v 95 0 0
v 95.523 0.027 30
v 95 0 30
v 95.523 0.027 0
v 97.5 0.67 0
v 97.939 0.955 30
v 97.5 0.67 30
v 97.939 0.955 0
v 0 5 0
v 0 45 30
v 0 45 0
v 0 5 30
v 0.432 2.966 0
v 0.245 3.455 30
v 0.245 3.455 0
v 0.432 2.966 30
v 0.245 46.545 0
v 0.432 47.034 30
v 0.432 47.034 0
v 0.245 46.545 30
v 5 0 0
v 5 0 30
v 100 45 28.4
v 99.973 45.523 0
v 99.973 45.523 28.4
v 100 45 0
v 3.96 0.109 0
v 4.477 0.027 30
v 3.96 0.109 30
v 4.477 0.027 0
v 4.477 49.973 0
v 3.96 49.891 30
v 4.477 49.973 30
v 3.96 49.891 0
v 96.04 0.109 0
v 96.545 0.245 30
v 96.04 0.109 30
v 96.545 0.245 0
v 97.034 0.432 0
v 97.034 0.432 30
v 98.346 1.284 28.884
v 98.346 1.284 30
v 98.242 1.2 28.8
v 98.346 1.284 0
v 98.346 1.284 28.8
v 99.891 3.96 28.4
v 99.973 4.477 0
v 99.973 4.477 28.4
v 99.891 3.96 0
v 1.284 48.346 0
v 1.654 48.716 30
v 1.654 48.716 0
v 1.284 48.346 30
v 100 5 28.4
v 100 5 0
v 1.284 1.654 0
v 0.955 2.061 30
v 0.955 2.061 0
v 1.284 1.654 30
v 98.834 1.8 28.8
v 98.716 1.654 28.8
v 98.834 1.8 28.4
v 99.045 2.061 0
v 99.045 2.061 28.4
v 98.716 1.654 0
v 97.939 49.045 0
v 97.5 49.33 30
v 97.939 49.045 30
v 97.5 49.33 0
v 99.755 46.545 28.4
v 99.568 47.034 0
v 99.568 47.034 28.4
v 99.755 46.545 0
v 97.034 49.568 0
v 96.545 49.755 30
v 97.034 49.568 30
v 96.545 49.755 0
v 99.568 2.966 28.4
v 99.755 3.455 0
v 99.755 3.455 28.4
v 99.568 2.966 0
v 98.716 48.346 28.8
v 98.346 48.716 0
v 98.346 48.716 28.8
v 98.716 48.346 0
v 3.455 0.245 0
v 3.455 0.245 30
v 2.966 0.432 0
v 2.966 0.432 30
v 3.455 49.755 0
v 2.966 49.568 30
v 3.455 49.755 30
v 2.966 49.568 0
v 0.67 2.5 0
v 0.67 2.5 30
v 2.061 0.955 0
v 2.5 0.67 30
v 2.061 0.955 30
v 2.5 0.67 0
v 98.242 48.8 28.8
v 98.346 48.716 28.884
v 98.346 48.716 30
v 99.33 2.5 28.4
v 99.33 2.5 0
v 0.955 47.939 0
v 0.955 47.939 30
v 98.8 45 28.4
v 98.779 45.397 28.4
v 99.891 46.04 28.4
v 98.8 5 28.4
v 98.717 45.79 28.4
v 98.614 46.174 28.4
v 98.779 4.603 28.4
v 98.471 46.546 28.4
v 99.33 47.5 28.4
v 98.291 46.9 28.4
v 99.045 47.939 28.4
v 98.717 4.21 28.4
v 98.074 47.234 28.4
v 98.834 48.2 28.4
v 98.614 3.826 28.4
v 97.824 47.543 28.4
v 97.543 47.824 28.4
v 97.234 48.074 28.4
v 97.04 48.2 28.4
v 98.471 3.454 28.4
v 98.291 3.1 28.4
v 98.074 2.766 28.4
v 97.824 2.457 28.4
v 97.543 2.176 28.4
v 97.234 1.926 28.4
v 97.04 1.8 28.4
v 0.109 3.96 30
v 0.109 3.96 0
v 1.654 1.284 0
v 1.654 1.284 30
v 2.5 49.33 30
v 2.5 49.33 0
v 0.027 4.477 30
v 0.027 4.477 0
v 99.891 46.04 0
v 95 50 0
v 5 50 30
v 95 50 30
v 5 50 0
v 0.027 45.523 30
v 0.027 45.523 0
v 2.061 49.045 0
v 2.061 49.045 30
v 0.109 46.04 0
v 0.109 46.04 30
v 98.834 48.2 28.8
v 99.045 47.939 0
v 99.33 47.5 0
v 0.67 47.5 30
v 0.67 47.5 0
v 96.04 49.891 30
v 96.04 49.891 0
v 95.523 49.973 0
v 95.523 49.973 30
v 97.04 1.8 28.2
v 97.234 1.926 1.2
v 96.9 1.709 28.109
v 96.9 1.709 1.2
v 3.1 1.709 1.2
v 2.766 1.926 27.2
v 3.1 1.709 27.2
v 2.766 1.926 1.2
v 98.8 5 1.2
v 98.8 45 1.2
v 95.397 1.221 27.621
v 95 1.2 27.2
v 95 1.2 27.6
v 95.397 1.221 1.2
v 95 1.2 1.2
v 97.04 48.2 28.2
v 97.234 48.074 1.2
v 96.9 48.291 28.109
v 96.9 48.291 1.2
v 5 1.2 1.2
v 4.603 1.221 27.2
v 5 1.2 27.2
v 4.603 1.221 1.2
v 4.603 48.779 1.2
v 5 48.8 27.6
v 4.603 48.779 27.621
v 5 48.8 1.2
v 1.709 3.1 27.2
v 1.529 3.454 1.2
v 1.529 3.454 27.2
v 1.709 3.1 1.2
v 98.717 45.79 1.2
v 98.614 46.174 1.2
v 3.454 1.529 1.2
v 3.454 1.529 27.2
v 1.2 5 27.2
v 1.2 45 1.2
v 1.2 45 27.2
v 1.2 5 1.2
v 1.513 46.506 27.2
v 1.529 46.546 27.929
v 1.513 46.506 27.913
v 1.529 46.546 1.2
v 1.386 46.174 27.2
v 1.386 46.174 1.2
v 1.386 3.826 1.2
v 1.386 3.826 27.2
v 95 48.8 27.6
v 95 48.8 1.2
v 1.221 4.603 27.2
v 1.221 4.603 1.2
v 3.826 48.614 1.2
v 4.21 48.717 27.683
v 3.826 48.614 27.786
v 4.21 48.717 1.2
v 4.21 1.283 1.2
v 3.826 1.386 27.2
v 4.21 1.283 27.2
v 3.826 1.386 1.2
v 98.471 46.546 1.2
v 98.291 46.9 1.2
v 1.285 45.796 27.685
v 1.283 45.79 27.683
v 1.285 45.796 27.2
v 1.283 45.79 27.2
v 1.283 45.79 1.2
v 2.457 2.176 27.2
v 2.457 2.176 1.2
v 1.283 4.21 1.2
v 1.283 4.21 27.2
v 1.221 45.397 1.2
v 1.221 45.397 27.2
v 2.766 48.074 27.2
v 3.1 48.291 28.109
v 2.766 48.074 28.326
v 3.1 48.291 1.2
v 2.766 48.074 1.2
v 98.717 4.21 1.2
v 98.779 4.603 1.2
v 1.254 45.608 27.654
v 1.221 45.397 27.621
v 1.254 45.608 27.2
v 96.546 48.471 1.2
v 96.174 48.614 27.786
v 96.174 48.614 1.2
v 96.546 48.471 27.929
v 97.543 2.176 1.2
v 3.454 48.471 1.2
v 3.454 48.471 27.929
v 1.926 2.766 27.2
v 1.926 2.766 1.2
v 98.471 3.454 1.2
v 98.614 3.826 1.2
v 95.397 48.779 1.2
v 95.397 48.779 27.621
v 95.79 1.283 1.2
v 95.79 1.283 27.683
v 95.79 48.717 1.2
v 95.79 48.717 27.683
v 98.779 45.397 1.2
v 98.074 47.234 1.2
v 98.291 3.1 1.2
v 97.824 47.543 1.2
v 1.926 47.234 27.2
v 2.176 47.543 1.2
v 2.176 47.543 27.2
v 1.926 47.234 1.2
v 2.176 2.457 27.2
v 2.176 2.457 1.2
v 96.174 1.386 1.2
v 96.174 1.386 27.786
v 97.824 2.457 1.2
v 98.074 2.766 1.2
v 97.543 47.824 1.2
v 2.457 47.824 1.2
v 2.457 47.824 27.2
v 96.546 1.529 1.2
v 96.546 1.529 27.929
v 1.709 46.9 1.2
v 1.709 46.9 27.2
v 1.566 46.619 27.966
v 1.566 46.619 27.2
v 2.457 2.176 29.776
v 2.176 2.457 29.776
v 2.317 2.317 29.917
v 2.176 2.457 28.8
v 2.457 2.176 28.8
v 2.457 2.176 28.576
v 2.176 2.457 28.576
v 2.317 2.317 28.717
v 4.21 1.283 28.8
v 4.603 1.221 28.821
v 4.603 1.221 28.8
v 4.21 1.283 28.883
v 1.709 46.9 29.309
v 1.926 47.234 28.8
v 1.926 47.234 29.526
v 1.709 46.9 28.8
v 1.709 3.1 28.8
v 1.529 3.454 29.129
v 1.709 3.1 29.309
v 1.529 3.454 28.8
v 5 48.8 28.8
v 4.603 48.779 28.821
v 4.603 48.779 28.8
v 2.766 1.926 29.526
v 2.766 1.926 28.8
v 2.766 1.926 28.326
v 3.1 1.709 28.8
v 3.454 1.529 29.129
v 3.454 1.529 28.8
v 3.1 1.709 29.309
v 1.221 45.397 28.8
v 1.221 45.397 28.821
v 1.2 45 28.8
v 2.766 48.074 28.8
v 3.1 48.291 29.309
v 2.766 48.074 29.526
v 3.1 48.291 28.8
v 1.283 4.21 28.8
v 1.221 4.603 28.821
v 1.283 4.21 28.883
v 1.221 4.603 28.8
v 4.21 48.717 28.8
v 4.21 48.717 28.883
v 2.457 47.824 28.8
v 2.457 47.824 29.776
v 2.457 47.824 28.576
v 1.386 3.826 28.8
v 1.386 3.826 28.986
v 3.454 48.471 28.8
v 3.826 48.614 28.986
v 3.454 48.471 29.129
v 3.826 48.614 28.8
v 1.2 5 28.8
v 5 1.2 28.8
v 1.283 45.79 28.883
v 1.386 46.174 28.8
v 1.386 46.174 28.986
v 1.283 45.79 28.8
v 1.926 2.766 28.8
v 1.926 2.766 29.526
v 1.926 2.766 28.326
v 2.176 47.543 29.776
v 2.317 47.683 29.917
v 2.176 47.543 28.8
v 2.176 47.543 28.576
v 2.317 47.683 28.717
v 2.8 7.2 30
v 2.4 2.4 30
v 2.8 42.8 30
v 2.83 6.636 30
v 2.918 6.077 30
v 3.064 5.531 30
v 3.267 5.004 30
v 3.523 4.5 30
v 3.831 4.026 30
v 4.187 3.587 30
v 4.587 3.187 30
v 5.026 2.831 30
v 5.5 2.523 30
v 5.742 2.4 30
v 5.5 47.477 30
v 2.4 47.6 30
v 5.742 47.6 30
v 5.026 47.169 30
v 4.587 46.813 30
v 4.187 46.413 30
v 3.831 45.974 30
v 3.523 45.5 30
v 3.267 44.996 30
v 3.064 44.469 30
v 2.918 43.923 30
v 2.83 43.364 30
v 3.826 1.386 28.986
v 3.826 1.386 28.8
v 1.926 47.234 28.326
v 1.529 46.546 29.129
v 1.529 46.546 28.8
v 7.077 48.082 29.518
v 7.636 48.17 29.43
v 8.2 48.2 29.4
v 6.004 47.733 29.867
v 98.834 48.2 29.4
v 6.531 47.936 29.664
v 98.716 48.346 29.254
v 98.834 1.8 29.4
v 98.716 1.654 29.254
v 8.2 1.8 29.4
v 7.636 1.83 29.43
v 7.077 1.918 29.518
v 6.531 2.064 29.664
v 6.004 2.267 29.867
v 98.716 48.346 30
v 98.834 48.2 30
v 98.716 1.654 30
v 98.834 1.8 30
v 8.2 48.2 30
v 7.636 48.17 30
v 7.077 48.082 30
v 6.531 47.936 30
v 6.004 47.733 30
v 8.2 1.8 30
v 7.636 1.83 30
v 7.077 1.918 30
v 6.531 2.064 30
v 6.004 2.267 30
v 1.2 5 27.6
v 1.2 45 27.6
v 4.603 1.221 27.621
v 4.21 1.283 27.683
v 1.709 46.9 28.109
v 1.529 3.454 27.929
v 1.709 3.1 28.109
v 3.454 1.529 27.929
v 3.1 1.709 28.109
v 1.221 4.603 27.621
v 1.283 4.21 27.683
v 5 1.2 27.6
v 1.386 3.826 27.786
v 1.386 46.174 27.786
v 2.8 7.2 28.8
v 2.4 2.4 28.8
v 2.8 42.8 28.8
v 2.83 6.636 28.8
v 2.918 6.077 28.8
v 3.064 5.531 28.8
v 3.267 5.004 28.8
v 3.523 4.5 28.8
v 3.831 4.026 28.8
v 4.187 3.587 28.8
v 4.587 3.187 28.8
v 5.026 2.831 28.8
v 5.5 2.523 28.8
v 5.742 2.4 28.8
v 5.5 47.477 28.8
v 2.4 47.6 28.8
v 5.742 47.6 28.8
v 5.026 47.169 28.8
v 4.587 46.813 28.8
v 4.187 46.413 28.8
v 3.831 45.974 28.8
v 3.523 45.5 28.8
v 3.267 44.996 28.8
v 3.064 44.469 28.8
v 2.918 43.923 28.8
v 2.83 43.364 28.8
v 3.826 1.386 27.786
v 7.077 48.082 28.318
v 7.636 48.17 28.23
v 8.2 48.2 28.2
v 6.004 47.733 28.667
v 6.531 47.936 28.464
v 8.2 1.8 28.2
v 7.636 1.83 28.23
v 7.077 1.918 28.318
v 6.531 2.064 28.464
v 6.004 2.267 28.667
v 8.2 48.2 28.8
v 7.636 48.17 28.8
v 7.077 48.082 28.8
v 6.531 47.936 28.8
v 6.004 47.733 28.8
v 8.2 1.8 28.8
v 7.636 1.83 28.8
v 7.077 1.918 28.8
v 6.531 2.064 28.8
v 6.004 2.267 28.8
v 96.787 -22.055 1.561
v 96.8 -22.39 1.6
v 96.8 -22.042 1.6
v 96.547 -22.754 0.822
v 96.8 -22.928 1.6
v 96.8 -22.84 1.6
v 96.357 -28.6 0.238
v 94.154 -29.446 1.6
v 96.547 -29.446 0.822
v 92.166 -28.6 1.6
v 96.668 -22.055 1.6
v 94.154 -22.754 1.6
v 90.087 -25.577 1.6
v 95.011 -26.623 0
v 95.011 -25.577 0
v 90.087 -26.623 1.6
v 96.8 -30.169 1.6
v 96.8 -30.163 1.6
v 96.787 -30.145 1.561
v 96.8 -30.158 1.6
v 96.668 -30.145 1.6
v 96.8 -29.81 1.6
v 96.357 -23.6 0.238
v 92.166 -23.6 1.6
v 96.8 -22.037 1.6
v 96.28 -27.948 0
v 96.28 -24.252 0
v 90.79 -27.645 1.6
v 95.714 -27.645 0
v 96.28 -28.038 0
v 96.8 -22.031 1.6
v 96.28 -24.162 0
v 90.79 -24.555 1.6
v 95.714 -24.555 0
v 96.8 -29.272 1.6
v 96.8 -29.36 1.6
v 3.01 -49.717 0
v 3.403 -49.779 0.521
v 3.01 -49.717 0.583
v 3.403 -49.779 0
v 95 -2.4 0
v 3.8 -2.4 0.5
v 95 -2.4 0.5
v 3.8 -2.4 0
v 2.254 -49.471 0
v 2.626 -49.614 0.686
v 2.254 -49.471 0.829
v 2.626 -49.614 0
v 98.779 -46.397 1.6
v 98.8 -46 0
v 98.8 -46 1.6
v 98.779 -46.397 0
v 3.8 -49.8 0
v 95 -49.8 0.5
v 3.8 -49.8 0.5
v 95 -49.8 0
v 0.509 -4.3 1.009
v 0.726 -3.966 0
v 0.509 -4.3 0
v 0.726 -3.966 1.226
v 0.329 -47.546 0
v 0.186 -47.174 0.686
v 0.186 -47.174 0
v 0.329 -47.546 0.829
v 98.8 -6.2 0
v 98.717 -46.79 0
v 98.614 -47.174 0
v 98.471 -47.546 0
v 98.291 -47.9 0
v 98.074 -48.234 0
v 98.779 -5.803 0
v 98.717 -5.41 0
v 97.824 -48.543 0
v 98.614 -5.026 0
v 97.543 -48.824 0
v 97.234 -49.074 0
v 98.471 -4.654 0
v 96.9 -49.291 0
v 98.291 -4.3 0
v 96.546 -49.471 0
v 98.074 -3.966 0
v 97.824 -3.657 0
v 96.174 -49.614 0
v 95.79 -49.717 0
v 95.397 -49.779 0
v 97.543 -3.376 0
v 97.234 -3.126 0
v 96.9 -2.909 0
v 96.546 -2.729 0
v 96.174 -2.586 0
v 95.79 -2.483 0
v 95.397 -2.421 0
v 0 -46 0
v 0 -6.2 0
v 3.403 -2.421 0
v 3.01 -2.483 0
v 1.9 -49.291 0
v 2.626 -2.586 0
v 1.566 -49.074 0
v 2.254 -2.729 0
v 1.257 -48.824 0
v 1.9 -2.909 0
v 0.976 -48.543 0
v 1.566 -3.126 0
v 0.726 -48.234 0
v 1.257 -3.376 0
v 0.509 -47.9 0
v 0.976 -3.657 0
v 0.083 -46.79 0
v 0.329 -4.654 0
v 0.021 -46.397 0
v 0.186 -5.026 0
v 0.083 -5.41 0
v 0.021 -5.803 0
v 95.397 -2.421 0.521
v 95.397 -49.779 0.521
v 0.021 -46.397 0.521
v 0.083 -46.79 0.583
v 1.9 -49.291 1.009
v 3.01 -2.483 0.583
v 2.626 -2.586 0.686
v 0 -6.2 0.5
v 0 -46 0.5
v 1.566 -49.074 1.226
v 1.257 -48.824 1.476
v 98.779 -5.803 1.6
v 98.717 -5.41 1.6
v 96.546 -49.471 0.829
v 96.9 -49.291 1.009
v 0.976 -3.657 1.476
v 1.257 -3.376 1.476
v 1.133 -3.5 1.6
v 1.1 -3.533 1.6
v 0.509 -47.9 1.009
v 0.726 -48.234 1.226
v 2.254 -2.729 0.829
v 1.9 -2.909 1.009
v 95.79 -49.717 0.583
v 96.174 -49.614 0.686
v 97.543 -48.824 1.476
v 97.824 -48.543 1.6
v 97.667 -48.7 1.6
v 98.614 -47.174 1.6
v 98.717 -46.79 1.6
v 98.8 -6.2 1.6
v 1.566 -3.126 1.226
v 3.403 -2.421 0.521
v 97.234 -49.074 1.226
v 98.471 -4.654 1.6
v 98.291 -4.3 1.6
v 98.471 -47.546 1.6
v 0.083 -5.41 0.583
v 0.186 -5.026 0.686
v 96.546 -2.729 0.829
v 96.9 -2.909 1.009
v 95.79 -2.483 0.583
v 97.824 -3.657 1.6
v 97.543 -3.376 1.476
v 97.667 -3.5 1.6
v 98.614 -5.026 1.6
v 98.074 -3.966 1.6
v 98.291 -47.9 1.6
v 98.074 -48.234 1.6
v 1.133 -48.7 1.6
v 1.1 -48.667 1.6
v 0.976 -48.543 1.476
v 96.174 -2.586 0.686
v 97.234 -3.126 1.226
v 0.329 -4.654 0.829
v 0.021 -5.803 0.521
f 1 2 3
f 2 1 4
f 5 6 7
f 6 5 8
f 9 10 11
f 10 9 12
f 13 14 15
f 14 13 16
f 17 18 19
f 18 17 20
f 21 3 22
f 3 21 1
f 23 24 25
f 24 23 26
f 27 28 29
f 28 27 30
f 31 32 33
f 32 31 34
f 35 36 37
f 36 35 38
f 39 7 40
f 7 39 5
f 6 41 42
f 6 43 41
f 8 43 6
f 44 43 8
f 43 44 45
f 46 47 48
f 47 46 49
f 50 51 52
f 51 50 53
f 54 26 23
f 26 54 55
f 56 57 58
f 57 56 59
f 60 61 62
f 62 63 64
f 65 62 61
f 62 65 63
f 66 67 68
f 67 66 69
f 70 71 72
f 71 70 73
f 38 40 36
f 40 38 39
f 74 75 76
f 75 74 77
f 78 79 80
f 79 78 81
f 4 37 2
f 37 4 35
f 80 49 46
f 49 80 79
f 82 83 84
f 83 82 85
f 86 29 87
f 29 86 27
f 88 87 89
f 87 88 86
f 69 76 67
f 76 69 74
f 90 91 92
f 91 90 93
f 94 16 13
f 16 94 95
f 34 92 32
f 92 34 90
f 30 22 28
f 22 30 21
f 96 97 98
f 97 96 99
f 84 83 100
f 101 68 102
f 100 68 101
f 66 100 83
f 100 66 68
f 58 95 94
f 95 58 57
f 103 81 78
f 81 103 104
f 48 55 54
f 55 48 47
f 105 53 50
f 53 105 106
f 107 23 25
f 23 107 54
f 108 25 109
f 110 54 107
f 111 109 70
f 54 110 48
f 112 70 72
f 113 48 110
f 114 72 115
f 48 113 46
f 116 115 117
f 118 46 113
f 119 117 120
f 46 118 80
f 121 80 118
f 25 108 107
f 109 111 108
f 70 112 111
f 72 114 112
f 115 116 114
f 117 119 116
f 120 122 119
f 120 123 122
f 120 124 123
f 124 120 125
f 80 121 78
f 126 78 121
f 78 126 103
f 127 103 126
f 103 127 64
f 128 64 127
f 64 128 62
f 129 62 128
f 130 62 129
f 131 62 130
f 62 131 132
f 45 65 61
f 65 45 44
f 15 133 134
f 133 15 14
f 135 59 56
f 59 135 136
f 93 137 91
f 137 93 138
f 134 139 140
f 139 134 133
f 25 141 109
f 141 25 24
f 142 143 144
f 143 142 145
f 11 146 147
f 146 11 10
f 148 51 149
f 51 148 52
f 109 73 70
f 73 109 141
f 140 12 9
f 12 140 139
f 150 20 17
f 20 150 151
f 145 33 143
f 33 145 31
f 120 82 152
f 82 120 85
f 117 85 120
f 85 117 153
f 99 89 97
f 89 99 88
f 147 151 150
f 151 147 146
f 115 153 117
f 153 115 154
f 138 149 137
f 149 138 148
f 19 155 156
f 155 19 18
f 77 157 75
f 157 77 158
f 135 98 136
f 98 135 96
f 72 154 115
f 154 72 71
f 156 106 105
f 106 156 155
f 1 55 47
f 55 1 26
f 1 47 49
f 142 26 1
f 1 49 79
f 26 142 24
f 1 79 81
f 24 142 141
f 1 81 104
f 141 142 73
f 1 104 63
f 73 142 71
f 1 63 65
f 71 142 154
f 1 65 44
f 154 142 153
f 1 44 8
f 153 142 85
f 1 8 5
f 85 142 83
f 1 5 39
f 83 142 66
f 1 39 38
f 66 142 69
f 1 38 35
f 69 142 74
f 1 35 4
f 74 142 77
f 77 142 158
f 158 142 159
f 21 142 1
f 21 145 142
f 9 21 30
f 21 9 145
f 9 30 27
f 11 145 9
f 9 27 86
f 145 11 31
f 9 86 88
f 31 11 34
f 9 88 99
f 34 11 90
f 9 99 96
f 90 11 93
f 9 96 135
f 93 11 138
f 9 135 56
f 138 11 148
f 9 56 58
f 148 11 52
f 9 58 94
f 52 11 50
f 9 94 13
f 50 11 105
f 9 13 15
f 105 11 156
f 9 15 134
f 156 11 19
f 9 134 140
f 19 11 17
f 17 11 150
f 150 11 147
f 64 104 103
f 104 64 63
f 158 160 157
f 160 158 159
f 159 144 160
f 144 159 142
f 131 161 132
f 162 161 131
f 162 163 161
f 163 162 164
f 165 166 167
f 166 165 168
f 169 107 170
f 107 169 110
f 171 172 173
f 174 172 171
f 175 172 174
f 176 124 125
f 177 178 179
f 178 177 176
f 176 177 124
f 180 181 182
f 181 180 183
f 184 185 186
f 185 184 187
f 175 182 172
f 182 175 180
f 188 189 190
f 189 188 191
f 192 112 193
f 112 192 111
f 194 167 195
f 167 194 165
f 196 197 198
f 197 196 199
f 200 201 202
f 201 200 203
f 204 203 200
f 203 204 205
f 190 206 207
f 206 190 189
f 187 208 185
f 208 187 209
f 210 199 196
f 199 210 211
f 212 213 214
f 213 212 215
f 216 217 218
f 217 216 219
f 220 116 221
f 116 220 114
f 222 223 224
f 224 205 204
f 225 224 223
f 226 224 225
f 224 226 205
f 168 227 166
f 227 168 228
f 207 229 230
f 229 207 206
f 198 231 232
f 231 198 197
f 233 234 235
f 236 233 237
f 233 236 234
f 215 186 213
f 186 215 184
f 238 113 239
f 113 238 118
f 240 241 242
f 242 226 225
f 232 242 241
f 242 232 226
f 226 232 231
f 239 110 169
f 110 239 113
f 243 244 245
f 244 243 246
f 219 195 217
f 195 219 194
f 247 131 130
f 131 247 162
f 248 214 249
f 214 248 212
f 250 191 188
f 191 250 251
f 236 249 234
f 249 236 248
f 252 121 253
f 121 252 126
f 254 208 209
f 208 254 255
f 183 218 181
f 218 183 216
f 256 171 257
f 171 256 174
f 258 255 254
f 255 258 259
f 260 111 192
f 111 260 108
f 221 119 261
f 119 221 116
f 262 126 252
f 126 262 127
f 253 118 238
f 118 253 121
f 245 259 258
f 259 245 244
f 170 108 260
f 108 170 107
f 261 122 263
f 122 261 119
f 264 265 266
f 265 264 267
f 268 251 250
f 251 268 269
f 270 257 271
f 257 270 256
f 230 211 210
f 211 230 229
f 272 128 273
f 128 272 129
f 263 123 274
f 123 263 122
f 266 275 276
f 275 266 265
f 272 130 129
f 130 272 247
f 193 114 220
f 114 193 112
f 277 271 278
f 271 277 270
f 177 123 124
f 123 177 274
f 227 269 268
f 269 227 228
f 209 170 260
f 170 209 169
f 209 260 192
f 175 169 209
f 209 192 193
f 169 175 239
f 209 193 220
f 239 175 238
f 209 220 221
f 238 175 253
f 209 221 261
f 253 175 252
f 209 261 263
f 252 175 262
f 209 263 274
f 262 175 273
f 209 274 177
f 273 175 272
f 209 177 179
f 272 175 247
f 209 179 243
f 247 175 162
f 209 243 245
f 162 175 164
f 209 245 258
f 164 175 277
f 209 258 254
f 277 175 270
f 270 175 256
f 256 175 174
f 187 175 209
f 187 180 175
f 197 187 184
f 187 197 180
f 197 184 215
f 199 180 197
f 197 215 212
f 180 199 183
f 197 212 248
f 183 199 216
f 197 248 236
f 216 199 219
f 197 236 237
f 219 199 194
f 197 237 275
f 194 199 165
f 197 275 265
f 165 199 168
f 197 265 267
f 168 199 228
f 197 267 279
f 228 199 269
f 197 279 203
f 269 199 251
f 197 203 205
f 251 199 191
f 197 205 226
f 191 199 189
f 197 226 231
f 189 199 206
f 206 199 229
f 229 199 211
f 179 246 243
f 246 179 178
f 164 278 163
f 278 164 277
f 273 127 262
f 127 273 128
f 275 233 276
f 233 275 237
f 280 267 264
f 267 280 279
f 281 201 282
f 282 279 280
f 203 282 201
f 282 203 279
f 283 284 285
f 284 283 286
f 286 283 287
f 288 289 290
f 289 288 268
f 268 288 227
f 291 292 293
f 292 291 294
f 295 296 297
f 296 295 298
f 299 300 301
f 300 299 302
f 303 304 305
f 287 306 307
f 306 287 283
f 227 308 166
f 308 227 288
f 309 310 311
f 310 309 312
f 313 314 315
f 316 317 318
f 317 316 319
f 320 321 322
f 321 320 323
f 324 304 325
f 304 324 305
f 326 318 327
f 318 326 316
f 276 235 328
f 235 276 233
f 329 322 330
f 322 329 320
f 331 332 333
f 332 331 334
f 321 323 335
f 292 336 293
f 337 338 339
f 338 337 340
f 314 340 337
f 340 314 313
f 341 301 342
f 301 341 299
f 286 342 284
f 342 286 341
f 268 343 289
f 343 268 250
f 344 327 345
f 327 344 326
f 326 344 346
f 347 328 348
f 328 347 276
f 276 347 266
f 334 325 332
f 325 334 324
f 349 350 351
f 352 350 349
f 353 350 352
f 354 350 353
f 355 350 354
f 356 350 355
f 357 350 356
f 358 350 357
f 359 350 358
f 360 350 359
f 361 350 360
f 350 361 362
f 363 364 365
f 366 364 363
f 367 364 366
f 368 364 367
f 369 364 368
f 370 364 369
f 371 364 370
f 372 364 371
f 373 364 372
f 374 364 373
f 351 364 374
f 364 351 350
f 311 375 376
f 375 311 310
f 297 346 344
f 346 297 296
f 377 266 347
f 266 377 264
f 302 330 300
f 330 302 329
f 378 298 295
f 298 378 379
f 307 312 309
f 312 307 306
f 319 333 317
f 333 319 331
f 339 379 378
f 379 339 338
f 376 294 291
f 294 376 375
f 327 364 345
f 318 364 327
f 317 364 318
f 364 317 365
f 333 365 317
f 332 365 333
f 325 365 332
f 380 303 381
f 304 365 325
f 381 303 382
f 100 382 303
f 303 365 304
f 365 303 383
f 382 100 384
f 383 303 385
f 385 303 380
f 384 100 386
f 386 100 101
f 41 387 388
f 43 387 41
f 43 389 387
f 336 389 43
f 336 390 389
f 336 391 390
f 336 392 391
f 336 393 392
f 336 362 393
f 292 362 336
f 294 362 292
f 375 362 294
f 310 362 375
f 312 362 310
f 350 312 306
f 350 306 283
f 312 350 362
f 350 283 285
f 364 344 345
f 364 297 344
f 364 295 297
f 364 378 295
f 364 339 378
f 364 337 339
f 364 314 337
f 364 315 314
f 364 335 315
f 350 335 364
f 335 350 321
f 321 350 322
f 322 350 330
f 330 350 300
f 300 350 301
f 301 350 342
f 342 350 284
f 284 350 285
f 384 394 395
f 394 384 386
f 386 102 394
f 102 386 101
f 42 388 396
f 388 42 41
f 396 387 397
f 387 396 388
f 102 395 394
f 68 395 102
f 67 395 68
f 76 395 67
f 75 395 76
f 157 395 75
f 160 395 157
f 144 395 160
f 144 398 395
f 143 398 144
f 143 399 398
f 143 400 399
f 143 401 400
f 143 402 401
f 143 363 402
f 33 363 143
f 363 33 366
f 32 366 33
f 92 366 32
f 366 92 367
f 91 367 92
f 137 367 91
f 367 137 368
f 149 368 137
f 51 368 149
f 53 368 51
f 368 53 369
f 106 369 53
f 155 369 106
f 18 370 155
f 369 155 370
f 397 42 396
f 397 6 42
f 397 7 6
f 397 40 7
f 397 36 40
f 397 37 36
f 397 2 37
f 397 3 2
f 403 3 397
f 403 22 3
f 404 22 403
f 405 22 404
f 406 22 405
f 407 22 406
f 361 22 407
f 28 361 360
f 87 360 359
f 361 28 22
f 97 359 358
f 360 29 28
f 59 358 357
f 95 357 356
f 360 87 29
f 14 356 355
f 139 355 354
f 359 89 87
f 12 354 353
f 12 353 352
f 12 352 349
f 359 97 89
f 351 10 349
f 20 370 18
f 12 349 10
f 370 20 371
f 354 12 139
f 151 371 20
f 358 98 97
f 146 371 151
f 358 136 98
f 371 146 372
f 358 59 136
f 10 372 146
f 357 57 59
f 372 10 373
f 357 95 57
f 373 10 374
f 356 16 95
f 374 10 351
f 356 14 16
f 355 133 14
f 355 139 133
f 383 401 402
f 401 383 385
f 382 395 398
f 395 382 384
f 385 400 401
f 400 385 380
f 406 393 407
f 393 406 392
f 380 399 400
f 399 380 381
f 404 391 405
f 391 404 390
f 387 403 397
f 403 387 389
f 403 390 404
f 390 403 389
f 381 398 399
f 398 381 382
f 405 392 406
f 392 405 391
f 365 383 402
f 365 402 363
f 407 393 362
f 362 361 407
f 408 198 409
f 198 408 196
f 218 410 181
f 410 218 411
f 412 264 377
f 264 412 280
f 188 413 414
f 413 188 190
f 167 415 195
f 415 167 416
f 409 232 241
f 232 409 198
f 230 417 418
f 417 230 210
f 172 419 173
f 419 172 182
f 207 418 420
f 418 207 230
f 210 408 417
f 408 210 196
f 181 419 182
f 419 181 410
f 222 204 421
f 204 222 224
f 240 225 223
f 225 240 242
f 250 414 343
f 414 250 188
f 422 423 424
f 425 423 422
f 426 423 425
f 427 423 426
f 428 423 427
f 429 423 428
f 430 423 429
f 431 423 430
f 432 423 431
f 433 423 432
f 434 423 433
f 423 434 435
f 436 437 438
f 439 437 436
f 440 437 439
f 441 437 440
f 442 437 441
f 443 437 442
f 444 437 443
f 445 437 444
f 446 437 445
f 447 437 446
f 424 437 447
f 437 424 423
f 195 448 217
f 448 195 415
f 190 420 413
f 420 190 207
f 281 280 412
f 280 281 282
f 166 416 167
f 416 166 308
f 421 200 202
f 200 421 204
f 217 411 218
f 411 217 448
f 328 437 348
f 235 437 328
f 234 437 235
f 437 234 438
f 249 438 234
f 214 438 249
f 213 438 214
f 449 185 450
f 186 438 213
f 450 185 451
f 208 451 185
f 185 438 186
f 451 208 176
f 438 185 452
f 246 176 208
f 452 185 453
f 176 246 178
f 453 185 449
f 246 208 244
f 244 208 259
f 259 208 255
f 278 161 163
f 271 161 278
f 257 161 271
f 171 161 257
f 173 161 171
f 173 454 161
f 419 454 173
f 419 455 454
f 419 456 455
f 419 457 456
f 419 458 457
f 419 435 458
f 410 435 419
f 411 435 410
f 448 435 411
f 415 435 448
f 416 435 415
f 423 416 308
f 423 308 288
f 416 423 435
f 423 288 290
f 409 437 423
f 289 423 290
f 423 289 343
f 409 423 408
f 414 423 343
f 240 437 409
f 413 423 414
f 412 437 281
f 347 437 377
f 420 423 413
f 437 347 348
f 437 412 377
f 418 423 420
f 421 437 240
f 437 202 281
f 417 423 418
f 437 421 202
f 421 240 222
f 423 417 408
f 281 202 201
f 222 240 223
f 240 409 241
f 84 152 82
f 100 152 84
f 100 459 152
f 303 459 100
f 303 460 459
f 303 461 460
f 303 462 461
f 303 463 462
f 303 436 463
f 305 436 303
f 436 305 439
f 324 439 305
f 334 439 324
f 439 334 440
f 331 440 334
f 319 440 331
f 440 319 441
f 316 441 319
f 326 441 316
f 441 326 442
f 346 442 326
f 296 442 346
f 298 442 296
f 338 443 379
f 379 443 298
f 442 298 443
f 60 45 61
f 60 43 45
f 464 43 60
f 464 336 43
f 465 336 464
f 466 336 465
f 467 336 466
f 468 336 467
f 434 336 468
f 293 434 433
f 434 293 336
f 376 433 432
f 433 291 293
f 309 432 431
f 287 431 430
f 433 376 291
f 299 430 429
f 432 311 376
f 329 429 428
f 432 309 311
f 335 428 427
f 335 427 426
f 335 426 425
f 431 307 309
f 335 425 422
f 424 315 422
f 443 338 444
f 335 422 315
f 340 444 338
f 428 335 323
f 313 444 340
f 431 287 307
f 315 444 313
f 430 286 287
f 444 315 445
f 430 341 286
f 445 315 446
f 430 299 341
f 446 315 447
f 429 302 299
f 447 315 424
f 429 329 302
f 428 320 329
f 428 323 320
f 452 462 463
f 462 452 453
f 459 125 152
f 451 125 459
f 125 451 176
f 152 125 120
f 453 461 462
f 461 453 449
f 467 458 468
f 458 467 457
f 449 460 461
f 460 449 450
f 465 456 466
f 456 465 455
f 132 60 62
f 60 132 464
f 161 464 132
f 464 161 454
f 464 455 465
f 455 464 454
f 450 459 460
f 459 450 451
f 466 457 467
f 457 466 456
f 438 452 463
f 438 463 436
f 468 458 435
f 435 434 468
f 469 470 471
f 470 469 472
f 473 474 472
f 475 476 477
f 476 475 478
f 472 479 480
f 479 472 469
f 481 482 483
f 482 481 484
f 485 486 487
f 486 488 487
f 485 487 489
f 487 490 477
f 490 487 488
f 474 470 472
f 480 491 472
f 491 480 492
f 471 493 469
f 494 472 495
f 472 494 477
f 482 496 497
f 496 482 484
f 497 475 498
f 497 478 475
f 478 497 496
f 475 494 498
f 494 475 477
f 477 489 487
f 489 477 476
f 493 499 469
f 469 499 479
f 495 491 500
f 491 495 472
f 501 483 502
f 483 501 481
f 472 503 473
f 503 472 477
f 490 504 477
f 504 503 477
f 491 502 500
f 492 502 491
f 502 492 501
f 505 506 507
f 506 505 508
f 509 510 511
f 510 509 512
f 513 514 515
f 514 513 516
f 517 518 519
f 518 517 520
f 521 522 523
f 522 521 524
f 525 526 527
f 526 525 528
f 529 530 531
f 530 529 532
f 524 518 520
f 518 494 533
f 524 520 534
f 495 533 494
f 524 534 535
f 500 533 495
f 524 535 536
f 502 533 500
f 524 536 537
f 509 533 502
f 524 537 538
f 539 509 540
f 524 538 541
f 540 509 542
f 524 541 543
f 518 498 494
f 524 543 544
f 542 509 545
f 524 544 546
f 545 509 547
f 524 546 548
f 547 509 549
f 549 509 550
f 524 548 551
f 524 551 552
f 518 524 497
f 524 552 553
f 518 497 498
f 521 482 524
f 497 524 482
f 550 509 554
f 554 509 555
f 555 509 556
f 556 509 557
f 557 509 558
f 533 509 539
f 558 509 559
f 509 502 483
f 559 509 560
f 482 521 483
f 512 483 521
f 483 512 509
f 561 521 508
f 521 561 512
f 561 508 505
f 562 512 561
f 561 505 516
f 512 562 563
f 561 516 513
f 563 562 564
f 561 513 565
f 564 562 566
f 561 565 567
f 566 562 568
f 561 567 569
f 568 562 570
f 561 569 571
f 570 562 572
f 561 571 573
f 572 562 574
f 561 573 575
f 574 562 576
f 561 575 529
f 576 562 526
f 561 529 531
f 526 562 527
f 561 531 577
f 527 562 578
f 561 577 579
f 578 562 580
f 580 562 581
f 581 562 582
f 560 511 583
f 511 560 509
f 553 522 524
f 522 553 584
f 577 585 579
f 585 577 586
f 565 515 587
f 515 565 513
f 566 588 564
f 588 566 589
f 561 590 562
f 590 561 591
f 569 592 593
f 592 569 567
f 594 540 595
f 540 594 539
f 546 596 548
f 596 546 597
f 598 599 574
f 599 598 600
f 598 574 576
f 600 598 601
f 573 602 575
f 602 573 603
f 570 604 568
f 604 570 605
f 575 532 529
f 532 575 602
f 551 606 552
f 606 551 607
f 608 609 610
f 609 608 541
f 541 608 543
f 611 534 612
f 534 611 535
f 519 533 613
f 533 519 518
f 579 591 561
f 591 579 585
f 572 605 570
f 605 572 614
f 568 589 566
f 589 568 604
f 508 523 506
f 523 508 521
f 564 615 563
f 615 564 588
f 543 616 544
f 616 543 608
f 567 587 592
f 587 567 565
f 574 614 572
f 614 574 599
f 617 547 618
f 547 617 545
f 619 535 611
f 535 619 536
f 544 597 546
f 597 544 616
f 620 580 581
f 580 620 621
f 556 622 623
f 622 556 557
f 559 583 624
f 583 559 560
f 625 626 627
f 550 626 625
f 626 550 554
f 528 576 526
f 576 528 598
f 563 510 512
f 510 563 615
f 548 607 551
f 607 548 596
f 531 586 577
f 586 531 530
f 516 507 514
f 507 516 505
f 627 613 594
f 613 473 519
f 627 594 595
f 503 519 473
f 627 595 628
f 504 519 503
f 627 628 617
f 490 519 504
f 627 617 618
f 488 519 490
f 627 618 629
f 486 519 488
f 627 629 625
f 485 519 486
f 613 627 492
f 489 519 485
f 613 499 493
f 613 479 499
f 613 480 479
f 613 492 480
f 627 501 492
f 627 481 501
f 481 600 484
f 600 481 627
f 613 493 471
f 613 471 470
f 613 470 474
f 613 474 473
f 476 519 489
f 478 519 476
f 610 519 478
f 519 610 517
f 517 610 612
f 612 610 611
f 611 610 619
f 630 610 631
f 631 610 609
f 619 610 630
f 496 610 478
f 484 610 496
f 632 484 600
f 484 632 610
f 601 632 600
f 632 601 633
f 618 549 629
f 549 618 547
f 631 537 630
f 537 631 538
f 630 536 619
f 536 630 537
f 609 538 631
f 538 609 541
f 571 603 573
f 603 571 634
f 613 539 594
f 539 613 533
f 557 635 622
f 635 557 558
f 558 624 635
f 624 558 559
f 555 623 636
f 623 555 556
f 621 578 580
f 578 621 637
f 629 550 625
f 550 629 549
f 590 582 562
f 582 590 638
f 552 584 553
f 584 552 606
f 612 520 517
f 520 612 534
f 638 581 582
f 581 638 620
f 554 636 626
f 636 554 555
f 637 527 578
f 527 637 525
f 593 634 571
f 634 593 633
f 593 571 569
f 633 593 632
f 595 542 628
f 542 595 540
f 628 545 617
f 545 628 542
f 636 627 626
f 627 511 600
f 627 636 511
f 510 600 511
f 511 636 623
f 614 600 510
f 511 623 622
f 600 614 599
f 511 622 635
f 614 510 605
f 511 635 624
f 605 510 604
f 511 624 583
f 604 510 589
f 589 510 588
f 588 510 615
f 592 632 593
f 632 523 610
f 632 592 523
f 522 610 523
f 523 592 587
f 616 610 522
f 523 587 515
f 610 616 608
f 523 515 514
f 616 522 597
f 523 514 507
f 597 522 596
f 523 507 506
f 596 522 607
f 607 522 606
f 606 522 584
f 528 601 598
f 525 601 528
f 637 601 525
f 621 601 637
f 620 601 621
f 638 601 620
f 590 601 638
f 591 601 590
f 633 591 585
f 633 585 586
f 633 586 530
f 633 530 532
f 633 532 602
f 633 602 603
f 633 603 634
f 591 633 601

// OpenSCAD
itemsShown="both"; // [both,box,lid]
boxLength=100;
boxWidth=50;
boxHeight=30;
cornerRadius=5;
wallThickness=1.2;
bottomThickness=1.2;
lidThickness=1.6;
lidClearance=0.2;
lidEdgeThickness=0.5;
// Notch in the lid
withNotch=true;//true;//[true:false]

/* [Global] */
if (itemsShown=="box") showBox();
if (itemsShown=="lid") showLid();
if (itemsShown=="both"){showBox();showLid();}

module showLid(){
	translate ([0, -2*wallThickness, 0]) 
	roundBoxLid(l=boxLength-wallThickness,
				w=boxWidth-2*wallThickness-lidClearance,
				h=lidThickness,
				et=lidEdgeThickness,
				r=cornerRadius-wallThickness,
				notch=withNotch);
}

module showBox(){
	round_box(l=boxLength,
			  w=boxWidth,
			  h=boxHeight,
			  bt=bottomThickness,
			  wt=wallThickness,
			  lt=lidThickness,
			  r=cornerRadius);
}

module round_box(l=40,w=30,h=30,bt=2,wt=2,lt=2,r=5,){
	difference() { 
		round_cube(l=l,w=w,h=h-lt,r=r);
		translate ([wt, wt, bt]) 
		round_cube(l=l-wt*2,w=w-wt*2,h=h,r=r-wt);
	}
	//use two box rims. one to make a slope to support the lid
	roundBoxRim();
	translate ([0, 0, -wt]) roundBoxRim();
}

module roundBoxRim(l=boxLength,
				   w=boxWidth,
				   h=boxHeight,
				   et=lidEdgeThickness,
				   r=cornerRadius,
				   wt=wallThickness,
				   lt=lidThickness){
	difference() { 
		translate ([0, 0, h-lt]) 
		round_cube(l=l,w=w,h=lt,r=r);
		translate ([wt+lt,wt+lt-et*2,h-lt-0.1]) 
		round_cube(l=l*2,w=w-2*(wt+lt)+4*et,h=lt+0.2,r=r-wt+lt);

		//subtract out a lid to make the ledge
		translate ([wt, w-wt, h-lt-0.1])
		roundBoxLid(l=l*2,w=w-2*wt,h=lt+0.1,wt=wt,t=lt,et=0.5,r=r-wt,notch=false);
	}
}

module roundBoxLid(l=40,w=30,h=3,wt=2,t=2,et=0.5,r=5,notch=true){
	translate ([l, 0, 0]) 
	rotate (a = [0, 0, 180]) 
	difference(){
		round_cube(l=l,w=w,h=h,t=t,r=r);

		translate ([-1, 0, et]) rotate (a = [45, 0, 0])  cube (size = [l+2, h*2, h*2]); 
		translate ([-1, w, et]) rotate (a = [45, 0, 0])  cube (size = [l+2, h*2, h*2]); 
		translate ([l, -1, et]) rotate (a = [45, 0, 90]) cube (size = [w+2, h*2, h*2]); 
		if (notch==true){
			translate([2,w/2,h+0.001]) thumbNotch(10/2,72,t);
		}
	}
}

module thumbNotch(
	thumbR=12/2,
	angle=72,
	notchHeight=2){

	size=10*thumbR;

	rotate([0,0,90])
	difference(){
		translate([0,
					(thumbR*sin(angle)-notchHeight)/tan(angle),
					 thumbR*sin(angle)-notchHeight])
		rotate([angle,0,0])
		cylinder(r=thumbR,h=size,$fn=30);

		translate([-size,-size,0])
		cube(size*2);
	}
}

module round_cube(l=40,w=30,h=20,r=5,$fn=60){
	hull(){ 
		translate ([r, r, 0]) cylinder (h = h, r=r);
		translate ([r, w-r, 0]) cylinder (h = h, r=r);
		translate ([l-r,w-r, 0]) cylinder (h = h, r=r);
		translate ([l-r, r, 0]) cylinder (h = h, r=r);
	}
}
